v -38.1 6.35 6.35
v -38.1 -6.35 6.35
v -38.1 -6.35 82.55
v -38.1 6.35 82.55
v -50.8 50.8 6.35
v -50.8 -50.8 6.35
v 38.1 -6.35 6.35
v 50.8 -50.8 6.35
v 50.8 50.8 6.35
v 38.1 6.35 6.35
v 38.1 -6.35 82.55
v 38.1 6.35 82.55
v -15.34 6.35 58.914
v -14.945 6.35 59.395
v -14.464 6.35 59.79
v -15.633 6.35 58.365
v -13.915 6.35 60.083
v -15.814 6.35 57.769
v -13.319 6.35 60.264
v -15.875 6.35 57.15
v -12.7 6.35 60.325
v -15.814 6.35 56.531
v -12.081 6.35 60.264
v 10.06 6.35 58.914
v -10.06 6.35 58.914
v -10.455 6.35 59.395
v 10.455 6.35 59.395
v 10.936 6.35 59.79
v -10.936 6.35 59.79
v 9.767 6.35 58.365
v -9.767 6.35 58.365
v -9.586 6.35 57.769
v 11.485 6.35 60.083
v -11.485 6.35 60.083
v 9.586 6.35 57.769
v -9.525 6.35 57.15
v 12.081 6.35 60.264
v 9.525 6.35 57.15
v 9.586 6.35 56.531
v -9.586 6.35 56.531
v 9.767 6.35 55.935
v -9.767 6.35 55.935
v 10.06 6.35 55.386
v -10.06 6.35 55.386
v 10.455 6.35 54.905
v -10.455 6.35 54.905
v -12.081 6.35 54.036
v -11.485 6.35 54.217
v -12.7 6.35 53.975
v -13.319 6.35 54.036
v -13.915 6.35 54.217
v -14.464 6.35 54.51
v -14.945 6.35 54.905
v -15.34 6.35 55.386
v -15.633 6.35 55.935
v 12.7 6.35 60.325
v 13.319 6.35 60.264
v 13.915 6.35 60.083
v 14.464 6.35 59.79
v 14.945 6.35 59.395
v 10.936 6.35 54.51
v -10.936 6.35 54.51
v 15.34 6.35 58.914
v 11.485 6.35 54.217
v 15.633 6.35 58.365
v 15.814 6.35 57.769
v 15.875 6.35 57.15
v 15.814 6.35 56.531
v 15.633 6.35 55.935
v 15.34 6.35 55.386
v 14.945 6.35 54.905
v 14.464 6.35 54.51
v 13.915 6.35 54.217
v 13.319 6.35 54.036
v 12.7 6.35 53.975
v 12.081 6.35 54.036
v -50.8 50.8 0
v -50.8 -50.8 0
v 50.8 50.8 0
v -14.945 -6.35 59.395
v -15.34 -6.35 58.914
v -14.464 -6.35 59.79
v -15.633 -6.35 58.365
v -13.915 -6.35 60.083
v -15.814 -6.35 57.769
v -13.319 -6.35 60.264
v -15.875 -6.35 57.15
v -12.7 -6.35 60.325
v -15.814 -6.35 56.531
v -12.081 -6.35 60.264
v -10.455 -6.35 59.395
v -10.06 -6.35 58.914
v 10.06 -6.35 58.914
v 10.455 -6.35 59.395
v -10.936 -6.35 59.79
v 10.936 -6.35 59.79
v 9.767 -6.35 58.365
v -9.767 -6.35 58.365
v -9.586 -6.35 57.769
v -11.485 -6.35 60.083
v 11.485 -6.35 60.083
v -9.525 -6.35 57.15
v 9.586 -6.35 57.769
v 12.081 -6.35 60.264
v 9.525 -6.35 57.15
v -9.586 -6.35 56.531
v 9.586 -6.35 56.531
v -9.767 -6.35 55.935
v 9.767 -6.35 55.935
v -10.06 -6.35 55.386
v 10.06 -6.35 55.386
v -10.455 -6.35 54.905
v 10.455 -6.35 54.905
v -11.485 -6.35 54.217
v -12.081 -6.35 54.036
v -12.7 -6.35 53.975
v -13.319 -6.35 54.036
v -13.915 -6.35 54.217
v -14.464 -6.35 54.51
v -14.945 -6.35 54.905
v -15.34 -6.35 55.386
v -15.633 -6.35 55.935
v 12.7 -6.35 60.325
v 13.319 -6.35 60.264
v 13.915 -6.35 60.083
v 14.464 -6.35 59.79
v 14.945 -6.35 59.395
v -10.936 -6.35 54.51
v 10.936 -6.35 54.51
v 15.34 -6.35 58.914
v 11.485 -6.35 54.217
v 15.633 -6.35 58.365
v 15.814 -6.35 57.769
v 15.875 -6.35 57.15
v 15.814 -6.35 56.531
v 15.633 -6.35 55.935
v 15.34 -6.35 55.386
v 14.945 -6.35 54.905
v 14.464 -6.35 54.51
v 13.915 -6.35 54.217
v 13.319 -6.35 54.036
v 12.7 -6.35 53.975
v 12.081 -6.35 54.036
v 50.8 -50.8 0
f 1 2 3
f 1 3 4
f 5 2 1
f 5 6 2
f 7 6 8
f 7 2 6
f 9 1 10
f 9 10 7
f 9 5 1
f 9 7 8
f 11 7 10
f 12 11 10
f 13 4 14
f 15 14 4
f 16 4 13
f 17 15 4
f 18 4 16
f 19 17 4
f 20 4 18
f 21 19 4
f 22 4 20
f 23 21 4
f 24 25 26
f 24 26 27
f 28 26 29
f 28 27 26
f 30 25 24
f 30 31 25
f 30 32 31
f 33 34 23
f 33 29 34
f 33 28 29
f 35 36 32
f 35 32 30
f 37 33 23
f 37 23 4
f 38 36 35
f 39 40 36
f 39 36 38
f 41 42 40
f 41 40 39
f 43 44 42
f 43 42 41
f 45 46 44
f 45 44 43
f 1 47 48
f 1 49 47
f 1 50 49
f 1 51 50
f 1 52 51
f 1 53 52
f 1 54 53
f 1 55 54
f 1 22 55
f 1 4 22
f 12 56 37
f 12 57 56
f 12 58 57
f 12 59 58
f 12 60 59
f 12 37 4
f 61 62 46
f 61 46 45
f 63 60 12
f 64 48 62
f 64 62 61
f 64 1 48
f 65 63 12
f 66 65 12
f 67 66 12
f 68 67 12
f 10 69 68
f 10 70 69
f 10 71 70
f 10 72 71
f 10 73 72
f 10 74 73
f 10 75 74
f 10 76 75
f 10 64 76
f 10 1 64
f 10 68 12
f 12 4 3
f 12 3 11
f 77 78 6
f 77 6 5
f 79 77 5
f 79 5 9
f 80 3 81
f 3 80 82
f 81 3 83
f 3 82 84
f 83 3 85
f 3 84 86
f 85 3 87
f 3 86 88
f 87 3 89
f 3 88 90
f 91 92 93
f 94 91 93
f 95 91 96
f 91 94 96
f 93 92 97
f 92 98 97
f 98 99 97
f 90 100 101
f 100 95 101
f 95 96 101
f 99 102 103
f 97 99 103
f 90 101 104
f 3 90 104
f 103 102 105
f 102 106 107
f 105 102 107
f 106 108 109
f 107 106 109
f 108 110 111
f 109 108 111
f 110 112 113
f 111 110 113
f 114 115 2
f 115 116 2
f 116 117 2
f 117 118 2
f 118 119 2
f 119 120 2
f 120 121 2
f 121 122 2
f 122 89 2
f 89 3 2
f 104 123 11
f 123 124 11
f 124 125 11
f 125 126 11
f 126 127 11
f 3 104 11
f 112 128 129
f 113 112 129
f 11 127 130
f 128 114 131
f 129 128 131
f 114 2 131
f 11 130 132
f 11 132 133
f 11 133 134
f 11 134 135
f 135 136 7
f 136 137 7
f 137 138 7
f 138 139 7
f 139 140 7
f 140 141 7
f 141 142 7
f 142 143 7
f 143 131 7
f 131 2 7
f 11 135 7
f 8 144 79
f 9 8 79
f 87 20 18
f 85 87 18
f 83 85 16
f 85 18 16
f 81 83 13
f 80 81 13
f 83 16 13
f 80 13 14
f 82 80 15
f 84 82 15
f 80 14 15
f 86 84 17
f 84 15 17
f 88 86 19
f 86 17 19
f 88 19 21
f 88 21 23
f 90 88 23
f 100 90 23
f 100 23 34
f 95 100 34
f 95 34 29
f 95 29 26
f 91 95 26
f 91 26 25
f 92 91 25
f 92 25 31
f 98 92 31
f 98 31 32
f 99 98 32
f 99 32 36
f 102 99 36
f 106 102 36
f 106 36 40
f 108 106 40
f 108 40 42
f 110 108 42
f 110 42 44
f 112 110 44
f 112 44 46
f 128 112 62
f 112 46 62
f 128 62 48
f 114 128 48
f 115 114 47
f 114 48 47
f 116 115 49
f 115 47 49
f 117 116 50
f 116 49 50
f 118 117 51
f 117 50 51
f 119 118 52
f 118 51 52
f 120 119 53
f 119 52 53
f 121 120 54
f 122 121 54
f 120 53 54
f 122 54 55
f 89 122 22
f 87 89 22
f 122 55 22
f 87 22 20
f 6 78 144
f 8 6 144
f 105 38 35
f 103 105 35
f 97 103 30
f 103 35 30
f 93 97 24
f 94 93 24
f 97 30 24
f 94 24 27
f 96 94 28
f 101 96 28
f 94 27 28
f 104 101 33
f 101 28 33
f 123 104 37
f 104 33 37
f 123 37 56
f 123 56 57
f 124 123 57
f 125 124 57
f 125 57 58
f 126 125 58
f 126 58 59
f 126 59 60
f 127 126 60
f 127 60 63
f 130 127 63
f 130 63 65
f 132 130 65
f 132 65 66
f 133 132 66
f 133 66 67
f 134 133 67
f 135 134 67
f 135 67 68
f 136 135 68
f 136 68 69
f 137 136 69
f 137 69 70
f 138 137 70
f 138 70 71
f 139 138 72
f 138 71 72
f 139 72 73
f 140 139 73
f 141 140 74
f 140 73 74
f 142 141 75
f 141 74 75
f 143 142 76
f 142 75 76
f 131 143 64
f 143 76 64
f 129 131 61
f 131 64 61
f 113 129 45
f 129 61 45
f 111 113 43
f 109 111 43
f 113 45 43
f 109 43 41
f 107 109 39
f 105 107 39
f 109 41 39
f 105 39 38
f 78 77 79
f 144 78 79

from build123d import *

# Parameters (mm, degrees)
F0_W     = 101.6
F0_H     = 101.6
F1_DEPTH = 6.35
F2_W     = 76.2
F2_H     = 12.7
F3_DEPTH = 76.2
F5_D     = 6.35


with BuildPart() as f1:
    # F0 (on Top) → F1 (new body)
    with BuildSketch(Plane.XY):
        Rectangle(F0_W, F0_H)
    extrude(amount=F1_DEPTH)

    # F2 (on face) → F3 (join)
    with BuildSketch(Plane.XY.offset(6.35)):
        Rectangle(F2_W, F2_H)
    extrude(amount=F3_DEPTH)

    # F5 (through all)
    with Locations(Plane.XZ.offset(6.35)):
        with Locations((-12.7, 57.15), (12.7, 57.15)):
            Hole(F5_D / 2)


solid = f1.part
